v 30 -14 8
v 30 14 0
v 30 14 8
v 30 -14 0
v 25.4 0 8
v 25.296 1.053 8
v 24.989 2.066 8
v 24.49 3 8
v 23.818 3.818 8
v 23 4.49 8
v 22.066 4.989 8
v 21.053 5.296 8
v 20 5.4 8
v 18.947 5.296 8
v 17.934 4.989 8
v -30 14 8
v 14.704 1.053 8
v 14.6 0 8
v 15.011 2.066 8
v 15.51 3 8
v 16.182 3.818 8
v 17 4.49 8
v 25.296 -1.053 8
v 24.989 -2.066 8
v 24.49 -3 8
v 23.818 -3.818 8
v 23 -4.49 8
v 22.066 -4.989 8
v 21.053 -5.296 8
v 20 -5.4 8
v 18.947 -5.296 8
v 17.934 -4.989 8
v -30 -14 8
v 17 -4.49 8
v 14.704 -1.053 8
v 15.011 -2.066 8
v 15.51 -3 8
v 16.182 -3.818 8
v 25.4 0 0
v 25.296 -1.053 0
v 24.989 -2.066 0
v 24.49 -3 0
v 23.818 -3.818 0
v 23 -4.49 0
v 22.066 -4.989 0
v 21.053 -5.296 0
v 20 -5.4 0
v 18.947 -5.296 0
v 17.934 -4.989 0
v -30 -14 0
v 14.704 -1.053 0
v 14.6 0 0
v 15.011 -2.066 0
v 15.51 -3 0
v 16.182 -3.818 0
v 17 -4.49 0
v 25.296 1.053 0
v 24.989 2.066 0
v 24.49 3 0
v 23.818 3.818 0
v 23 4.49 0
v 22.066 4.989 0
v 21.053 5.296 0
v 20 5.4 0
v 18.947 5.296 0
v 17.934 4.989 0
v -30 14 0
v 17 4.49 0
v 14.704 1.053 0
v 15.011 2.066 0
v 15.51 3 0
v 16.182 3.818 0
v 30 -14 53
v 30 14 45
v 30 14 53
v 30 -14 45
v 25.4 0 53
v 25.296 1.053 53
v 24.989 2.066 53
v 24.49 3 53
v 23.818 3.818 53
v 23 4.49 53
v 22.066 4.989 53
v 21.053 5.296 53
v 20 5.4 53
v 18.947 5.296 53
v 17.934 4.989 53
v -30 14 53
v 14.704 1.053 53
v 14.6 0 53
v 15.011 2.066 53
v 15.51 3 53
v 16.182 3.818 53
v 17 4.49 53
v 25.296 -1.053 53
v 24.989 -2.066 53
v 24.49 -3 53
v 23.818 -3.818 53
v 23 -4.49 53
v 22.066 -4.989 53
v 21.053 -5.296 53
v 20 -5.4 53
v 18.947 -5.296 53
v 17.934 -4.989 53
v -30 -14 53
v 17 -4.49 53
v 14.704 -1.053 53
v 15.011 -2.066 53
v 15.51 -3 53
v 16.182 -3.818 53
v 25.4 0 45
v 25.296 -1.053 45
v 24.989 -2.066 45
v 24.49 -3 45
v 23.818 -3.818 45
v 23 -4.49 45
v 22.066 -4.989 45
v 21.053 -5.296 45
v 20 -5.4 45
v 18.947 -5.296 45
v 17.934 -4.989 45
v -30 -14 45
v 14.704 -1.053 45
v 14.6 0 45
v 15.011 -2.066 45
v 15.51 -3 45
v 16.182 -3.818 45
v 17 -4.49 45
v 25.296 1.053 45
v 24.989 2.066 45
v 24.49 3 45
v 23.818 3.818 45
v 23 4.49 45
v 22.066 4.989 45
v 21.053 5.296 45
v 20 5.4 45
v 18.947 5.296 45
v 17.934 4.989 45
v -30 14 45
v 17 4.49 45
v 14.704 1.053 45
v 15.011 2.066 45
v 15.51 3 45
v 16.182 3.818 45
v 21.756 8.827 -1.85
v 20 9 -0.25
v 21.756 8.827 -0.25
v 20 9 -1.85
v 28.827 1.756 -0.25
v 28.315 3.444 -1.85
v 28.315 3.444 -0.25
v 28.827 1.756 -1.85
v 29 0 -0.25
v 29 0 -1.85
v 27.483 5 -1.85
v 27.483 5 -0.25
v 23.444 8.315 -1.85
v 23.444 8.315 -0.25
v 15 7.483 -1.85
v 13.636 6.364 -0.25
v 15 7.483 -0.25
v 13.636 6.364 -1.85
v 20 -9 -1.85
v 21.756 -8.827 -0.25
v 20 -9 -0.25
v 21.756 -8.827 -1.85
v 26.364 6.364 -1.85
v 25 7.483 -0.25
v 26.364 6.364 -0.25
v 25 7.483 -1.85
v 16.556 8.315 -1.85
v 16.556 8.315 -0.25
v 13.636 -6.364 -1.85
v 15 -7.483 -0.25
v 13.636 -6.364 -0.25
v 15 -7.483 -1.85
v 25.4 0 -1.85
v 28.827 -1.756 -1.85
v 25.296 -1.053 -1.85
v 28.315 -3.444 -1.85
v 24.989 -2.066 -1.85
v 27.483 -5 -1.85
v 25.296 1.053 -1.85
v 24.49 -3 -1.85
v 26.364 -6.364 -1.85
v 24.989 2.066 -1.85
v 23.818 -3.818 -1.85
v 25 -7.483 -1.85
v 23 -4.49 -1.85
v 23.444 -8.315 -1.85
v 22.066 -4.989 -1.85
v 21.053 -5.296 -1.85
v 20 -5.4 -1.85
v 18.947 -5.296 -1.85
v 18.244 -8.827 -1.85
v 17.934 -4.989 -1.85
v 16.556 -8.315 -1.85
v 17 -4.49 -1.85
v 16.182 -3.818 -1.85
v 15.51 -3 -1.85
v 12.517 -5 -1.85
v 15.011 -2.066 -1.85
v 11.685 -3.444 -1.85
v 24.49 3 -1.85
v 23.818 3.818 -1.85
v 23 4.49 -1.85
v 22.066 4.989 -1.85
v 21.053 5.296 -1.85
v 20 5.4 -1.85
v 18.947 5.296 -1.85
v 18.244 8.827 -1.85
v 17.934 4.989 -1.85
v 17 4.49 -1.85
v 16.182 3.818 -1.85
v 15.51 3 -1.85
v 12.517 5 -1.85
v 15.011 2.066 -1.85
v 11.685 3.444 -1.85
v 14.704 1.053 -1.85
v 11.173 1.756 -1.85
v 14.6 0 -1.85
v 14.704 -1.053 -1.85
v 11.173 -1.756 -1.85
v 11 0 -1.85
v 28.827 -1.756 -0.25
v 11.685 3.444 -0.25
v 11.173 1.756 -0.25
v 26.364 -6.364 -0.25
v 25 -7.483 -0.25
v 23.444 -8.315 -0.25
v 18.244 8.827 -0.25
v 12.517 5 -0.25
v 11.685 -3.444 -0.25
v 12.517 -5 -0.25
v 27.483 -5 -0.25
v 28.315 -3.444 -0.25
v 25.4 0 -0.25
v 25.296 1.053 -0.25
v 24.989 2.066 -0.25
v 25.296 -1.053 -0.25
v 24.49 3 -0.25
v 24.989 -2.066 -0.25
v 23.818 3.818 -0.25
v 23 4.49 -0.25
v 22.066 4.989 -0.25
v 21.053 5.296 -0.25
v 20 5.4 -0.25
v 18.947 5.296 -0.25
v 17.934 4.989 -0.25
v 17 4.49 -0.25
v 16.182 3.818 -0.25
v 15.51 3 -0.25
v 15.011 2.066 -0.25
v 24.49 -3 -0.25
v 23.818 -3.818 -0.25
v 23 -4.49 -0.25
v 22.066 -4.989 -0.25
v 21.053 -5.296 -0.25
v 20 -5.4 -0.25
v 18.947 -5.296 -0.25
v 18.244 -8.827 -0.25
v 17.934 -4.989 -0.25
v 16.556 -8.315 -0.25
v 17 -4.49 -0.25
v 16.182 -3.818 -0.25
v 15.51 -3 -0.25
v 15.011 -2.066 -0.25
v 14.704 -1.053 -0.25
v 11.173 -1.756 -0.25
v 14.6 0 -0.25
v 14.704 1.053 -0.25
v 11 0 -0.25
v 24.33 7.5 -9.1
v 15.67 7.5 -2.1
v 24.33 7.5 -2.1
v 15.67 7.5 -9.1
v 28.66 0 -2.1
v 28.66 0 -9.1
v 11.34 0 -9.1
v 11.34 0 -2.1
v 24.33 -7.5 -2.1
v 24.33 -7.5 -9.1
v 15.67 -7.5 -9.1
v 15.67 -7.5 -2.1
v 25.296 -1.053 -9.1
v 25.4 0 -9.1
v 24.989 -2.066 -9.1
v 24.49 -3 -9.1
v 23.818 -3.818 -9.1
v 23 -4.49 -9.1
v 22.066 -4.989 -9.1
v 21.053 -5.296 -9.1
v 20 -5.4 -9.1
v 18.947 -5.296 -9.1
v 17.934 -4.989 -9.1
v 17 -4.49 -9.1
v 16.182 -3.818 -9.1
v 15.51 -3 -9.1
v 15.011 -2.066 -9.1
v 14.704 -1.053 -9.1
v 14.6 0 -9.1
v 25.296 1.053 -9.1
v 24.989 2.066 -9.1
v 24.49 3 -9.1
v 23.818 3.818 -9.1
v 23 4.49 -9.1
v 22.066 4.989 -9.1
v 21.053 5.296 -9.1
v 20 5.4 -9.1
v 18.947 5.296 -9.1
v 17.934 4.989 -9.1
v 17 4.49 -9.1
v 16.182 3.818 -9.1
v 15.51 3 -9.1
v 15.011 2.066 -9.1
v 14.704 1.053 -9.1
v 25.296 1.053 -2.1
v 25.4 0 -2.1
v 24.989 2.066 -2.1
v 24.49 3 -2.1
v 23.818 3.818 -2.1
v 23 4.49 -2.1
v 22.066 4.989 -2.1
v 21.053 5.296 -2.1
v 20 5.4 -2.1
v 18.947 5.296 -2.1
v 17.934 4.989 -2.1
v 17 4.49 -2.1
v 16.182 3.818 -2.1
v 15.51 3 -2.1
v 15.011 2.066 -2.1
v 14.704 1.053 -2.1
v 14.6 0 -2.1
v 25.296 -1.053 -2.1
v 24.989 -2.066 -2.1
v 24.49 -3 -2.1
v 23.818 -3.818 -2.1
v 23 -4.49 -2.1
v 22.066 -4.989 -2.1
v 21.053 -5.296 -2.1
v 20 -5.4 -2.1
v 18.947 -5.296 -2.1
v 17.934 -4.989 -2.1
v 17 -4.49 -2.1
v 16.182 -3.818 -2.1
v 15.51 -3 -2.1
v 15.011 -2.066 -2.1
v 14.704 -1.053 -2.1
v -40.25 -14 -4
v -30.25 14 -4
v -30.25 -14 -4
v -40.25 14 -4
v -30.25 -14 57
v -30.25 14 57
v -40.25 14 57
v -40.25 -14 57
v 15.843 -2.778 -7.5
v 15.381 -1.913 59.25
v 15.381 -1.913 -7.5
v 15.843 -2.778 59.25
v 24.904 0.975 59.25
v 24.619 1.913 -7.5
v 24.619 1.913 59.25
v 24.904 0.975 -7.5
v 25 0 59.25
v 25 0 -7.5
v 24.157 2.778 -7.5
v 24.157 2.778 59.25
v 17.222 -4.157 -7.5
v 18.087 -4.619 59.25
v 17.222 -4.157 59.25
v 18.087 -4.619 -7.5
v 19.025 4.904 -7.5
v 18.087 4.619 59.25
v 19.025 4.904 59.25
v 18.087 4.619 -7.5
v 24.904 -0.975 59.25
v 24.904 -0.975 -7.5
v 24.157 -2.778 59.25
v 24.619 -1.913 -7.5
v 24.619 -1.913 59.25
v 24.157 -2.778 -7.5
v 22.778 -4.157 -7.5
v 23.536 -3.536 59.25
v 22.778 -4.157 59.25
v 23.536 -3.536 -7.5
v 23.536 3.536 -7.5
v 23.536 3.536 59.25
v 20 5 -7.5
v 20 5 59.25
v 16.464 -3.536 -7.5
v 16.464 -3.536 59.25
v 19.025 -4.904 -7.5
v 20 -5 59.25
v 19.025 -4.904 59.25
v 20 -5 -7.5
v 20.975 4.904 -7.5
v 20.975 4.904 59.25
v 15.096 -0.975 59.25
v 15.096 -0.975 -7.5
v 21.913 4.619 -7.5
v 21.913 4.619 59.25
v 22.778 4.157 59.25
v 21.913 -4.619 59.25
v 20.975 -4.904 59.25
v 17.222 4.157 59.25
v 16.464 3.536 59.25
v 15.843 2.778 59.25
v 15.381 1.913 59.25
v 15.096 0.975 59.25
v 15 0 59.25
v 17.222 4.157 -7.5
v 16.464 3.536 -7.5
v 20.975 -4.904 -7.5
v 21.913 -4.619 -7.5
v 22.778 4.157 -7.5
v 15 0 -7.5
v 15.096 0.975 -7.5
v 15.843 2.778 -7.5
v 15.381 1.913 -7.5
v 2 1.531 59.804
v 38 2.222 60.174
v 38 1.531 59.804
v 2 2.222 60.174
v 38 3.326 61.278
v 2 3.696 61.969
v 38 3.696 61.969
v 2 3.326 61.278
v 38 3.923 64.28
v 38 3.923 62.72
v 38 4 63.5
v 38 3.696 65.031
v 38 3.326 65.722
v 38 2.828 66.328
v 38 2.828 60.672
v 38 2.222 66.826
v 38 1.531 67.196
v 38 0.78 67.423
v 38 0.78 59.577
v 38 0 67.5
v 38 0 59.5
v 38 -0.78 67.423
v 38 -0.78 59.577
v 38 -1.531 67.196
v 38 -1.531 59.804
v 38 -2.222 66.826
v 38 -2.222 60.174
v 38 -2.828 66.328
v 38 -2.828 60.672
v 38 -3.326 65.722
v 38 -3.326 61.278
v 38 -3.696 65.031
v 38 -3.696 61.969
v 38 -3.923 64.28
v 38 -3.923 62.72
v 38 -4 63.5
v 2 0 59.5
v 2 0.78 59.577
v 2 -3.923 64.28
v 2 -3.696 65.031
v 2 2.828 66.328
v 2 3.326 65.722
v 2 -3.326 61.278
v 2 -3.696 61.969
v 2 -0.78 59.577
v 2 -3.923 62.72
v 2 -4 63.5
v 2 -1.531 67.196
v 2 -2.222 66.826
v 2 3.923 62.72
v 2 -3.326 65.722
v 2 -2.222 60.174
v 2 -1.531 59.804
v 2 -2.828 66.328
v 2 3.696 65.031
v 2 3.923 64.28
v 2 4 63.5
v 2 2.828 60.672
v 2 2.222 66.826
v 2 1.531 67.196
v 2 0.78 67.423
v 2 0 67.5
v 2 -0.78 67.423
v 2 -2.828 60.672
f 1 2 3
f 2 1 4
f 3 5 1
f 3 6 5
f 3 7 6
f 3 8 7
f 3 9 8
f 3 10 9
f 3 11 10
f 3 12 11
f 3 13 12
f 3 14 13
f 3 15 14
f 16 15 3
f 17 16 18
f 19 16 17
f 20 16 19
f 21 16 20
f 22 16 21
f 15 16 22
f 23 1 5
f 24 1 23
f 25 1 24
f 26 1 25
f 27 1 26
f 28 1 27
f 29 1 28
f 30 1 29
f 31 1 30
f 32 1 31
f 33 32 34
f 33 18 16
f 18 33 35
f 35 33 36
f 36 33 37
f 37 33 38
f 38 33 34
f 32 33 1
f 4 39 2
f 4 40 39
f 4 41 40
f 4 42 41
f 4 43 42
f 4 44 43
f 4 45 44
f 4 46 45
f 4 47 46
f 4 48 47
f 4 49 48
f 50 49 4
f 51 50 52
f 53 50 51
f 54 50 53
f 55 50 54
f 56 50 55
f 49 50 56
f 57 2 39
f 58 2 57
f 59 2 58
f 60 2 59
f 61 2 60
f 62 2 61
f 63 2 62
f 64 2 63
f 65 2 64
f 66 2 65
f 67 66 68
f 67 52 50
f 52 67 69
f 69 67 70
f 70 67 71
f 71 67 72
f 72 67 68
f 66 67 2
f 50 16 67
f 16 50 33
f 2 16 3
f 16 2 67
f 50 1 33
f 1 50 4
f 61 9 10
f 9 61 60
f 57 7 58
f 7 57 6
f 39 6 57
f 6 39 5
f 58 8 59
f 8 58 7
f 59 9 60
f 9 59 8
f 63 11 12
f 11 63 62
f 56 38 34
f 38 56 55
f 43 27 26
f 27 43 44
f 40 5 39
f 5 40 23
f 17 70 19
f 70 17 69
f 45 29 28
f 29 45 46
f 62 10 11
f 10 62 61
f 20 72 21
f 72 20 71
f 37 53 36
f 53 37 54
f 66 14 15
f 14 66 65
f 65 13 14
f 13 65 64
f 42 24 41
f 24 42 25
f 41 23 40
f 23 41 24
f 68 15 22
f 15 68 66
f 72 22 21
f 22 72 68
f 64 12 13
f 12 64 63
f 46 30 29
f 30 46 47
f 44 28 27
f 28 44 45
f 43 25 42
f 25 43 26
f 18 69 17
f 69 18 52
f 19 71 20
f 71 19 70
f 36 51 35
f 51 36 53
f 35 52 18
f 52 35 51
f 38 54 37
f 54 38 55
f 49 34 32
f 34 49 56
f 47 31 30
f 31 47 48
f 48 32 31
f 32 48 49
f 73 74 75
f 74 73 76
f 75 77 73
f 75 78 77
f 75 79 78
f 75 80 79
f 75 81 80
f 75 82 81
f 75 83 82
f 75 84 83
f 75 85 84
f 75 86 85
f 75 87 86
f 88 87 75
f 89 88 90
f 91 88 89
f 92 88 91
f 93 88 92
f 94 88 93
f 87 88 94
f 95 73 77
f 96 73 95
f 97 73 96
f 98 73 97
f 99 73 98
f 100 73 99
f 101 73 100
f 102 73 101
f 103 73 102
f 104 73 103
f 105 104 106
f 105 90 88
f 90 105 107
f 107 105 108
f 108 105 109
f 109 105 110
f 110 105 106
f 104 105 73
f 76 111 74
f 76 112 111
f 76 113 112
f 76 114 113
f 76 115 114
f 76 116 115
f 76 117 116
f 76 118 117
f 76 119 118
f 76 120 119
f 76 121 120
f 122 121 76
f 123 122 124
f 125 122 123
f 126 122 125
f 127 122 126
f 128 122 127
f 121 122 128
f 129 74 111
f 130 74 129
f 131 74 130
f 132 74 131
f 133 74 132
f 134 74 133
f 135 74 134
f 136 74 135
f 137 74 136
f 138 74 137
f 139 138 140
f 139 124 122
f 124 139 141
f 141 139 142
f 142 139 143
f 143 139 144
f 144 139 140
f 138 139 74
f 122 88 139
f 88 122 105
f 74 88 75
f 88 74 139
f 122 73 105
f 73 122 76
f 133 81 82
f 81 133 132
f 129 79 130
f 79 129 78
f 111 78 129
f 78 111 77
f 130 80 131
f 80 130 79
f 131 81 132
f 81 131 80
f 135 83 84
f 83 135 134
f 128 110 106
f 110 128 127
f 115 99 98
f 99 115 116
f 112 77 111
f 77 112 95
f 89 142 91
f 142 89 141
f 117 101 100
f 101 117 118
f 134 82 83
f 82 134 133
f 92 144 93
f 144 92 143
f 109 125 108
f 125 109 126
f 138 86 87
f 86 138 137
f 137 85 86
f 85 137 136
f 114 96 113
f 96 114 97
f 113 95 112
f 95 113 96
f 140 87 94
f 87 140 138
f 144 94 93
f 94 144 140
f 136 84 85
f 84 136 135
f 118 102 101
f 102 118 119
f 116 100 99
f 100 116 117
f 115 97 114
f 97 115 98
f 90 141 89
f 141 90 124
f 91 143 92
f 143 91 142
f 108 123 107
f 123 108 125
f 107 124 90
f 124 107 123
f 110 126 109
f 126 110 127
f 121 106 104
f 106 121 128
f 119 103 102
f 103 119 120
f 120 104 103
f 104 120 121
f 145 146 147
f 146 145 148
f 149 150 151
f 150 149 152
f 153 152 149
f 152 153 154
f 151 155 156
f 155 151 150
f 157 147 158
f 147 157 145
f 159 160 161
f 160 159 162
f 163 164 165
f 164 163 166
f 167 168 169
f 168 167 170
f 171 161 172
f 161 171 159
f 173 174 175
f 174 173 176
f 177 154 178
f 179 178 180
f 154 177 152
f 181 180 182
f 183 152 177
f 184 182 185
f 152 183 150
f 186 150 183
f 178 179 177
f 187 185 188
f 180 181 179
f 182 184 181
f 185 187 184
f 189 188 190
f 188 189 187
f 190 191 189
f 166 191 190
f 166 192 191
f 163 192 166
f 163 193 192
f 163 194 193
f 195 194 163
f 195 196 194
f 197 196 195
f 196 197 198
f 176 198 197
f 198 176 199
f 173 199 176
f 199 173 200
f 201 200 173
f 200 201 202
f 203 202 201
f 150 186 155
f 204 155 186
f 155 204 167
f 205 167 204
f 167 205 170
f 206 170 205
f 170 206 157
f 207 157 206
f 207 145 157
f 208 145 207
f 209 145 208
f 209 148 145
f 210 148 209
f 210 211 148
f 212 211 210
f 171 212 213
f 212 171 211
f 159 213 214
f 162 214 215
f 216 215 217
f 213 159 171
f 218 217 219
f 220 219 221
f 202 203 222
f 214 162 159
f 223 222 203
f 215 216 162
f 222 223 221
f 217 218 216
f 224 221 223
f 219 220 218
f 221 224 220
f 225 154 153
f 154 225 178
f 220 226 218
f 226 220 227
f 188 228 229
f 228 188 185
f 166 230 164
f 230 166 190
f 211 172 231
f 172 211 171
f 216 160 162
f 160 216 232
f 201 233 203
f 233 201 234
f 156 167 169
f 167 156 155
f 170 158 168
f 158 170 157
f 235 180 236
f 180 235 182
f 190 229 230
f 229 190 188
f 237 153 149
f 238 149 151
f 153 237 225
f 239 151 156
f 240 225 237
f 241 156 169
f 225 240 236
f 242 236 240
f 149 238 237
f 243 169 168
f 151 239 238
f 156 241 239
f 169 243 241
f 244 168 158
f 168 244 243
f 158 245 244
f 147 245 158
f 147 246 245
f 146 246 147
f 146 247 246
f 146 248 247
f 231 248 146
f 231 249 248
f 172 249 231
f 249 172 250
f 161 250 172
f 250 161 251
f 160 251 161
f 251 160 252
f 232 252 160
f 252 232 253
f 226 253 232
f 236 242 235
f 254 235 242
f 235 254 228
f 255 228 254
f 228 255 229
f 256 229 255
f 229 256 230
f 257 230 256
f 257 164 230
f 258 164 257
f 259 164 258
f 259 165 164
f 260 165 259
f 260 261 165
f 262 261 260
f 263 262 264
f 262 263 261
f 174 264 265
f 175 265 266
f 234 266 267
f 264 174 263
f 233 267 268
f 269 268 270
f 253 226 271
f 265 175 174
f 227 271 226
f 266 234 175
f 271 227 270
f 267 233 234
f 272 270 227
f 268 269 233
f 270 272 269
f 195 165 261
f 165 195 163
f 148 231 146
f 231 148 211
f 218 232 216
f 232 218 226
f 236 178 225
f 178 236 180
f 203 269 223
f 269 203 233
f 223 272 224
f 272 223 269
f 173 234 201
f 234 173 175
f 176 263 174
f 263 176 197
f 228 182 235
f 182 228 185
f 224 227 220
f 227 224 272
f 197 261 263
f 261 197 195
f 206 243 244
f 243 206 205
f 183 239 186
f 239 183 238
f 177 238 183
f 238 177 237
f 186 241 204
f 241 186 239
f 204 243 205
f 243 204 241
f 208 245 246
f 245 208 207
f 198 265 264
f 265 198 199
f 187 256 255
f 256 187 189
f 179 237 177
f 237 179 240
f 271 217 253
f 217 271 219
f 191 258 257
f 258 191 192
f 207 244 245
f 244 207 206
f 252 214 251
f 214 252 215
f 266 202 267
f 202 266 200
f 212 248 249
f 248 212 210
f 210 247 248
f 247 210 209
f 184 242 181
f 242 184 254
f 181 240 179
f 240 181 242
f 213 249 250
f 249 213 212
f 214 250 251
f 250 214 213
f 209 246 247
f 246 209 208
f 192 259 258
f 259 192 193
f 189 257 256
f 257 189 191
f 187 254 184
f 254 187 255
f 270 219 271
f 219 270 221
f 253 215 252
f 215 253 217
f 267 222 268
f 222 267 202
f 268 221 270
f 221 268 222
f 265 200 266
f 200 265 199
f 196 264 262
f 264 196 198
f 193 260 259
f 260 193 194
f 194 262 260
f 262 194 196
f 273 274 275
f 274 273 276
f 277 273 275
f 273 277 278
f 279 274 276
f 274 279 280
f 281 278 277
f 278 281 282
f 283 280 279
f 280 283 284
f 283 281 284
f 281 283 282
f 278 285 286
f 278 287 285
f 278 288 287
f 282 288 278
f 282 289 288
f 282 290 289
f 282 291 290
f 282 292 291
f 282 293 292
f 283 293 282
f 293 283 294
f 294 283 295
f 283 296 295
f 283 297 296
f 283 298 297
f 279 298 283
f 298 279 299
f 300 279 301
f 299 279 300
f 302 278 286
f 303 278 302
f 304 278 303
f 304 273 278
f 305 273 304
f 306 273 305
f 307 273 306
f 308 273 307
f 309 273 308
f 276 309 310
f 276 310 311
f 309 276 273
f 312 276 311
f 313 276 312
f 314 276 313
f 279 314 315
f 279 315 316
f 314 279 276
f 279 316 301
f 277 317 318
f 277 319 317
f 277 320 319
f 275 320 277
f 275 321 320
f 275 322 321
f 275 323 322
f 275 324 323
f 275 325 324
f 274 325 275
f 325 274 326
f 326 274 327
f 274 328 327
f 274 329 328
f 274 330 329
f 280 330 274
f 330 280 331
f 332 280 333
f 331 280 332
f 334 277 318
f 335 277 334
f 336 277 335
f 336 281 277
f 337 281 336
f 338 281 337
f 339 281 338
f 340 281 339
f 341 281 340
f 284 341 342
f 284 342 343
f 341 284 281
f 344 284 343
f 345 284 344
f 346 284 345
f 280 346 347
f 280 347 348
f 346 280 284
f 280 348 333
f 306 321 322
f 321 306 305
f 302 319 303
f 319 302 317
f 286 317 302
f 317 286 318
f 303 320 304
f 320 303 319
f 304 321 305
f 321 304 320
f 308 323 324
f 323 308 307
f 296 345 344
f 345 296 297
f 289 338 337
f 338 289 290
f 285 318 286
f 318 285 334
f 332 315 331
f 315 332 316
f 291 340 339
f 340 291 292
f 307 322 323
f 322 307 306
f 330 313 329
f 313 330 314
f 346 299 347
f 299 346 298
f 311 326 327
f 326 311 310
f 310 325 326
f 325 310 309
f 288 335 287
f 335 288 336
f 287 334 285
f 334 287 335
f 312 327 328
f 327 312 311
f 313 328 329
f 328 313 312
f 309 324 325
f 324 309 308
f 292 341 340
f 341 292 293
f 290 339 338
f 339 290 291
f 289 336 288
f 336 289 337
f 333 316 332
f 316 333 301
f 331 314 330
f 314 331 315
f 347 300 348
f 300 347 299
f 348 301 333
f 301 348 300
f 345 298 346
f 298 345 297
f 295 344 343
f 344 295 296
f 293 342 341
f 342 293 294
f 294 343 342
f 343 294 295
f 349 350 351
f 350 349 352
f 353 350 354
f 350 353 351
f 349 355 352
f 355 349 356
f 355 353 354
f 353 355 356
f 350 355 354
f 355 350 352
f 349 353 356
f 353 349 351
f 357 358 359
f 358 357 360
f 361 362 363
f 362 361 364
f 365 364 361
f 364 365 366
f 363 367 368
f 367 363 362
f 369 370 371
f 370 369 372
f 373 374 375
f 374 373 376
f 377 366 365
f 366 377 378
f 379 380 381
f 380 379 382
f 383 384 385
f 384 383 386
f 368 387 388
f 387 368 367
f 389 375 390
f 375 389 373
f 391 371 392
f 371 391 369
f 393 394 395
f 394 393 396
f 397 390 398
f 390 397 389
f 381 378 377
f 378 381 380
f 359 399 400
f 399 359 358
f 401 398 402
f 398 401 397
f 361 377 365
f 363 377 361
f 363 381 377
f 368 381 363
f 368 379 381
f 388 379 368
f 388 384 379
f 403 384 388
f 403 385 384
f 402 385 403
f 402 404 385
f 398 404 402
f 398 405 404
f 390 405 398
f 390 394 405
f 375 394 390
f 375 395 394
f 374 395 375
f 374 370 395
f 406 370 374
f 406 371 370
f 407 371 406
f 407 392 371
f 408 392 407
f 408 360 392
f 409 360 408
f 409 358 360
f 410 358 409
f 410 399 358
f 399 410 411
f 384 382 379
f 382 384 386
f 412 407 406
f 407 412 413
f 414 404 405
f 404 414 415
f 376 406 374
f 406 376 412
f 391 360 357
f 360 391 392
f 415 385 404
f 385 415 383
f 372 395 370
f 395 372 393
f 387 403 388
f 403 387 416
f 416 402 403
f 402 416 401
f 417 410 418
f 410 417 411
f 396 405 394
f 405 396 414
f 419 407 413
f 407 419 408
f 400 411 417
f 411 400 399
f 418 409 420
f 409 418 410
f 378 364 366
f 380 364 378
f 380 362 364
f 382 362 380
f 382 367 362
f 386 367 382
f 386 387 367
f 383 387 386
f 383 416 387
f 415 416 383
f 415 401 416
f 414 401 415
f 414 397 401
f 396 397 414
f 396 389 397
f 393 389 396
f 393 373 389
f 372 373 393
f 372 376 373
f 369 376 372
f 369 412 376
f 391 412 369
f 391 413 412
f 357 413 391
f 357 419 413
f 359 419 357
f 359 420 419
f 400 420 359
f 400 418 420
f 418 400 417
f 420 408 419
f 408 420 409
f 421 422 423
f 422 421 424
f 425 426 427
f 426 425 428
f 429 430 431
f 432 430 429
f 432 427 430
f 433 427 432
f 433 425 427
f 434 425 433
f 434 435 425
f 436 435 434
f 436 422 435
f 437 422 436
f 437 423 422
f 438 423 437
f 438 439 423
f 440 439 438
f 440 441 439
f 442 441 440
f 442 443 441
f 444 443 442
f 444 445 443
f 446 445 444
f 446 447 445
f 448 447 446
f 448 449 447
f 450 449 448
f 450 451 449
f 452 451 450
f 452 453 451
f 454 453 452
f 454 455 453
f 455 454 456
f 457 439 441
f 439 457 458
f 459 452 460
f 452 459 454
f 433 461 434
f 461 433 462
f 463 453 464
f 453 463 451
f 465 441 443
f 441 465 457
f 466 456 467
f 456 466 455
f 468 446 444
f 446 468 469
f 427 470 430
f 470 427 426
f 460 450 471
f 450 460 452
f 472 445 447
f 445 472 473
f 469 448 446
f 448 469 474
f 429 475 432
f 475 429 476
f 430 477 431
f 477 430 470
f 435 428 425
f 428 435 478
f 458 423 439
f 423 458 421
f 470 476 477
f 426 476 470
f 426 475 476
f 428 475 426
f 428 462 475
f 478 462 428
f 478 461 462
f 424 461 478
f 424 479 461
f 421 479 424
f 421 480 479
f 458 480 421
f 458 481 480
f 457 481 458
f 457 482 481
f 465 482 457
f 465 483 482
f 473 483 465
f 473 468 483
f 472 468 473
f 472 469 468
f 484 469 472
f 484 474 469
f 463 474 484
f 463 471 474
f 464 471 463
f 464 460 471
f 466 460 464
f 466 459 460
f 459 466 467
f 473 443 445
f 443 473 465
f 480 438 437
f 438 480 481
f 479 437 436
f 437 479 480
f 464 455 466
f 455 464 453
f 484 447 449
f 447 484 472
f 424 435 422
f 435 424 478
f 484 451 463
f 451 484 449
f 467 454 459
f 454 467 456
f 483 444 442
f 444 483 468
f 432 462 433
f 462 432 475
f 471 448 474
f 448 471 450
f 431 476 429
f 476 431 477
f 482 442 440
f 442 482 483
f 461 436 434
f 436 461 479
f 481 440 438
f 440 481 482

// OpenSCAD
$fn = 32;

// ------------------------------------------------------------------------
// C clamp: throat 45 mm, screw d10
// Every part is its own module, assembly() places every instance.
// ------------------------------------------------------------------------

// --- part 1 ---
module clamp_arm() {
  difference() {
    translate([-30, -14, 0]) cube([60, 28, 8]);
    translate([20, 0, -1]) cylinder(h = 10, d = 10.8);
  }
}

// --- part 2 ---
module clamp_spine() {
  difference() {
    translate([-30.5, -14, 0]) cube([61, 28, 10]);
  }
}

// --- part 3 ---
module clamp_screw() {
  translate([0, 0, -33.375]) cylinder(h = 66.75, d = 10);
}

// --- part 4 ---
module clamp_washer() {
  difference() {
      translate([0, 0, 0]) cylinder(h = 1.6, d = 18);
      translate([0, 0, -1]) cylinder(h = 3.6, d = 10.8);
    }
}

// --- part 5 ---
module clamp_nut() {
  difference() {
    linear_extrude(height = 7) polygon(points = [[8.66, 0], [4.33, 7.5], [-4.33, 7.5], [-8.66, 0], [-4.33, -7.5], [4.33, -7.5]]);
    translate([0, 0, -1]) cylinder(h = 9, d = 10.8);
  }
}

// --- part 6 ---
module tommy_bar() {
  translate([0, 0, -18]) cylinder(h = 36, d = 8);
}

// --- assembly ---
module assembly() {
  color([0.80, 0.24, 0.20]) translate([0, 0, 0]) rotate([0, 0, 0]) clamp_arm();
  color([0.20, 0.45, 0.75]) translate([0, 0, 45]) rotate([0, 0, 0]) clamp_arm();
  color([0.25, 0.62, 0.32]) translate([-40.25, 0, 26.5]) rotate([0, 90, 0]) clamp_spine();
  color([0.92, 0.70, 0.18]) translate([20, 0, 25.875]) rotate([0, 0, 0]) clamp_screw();
  color([0.58, 0.35, 0.70]) translate([20, 0, -1.85]) rotate([0, 0, 0]) clamp_washer();
  color([0.16, 0.66, 0.66]) translate([20, 0, -9.1]) rotate([0, 0, 0]) clamp_nut();
  color([0.85, 0.48, 0.18]) translate([20, 0, 63.5]) rotate([0, 90, 0]) tommy_bar();
}

assembly();
